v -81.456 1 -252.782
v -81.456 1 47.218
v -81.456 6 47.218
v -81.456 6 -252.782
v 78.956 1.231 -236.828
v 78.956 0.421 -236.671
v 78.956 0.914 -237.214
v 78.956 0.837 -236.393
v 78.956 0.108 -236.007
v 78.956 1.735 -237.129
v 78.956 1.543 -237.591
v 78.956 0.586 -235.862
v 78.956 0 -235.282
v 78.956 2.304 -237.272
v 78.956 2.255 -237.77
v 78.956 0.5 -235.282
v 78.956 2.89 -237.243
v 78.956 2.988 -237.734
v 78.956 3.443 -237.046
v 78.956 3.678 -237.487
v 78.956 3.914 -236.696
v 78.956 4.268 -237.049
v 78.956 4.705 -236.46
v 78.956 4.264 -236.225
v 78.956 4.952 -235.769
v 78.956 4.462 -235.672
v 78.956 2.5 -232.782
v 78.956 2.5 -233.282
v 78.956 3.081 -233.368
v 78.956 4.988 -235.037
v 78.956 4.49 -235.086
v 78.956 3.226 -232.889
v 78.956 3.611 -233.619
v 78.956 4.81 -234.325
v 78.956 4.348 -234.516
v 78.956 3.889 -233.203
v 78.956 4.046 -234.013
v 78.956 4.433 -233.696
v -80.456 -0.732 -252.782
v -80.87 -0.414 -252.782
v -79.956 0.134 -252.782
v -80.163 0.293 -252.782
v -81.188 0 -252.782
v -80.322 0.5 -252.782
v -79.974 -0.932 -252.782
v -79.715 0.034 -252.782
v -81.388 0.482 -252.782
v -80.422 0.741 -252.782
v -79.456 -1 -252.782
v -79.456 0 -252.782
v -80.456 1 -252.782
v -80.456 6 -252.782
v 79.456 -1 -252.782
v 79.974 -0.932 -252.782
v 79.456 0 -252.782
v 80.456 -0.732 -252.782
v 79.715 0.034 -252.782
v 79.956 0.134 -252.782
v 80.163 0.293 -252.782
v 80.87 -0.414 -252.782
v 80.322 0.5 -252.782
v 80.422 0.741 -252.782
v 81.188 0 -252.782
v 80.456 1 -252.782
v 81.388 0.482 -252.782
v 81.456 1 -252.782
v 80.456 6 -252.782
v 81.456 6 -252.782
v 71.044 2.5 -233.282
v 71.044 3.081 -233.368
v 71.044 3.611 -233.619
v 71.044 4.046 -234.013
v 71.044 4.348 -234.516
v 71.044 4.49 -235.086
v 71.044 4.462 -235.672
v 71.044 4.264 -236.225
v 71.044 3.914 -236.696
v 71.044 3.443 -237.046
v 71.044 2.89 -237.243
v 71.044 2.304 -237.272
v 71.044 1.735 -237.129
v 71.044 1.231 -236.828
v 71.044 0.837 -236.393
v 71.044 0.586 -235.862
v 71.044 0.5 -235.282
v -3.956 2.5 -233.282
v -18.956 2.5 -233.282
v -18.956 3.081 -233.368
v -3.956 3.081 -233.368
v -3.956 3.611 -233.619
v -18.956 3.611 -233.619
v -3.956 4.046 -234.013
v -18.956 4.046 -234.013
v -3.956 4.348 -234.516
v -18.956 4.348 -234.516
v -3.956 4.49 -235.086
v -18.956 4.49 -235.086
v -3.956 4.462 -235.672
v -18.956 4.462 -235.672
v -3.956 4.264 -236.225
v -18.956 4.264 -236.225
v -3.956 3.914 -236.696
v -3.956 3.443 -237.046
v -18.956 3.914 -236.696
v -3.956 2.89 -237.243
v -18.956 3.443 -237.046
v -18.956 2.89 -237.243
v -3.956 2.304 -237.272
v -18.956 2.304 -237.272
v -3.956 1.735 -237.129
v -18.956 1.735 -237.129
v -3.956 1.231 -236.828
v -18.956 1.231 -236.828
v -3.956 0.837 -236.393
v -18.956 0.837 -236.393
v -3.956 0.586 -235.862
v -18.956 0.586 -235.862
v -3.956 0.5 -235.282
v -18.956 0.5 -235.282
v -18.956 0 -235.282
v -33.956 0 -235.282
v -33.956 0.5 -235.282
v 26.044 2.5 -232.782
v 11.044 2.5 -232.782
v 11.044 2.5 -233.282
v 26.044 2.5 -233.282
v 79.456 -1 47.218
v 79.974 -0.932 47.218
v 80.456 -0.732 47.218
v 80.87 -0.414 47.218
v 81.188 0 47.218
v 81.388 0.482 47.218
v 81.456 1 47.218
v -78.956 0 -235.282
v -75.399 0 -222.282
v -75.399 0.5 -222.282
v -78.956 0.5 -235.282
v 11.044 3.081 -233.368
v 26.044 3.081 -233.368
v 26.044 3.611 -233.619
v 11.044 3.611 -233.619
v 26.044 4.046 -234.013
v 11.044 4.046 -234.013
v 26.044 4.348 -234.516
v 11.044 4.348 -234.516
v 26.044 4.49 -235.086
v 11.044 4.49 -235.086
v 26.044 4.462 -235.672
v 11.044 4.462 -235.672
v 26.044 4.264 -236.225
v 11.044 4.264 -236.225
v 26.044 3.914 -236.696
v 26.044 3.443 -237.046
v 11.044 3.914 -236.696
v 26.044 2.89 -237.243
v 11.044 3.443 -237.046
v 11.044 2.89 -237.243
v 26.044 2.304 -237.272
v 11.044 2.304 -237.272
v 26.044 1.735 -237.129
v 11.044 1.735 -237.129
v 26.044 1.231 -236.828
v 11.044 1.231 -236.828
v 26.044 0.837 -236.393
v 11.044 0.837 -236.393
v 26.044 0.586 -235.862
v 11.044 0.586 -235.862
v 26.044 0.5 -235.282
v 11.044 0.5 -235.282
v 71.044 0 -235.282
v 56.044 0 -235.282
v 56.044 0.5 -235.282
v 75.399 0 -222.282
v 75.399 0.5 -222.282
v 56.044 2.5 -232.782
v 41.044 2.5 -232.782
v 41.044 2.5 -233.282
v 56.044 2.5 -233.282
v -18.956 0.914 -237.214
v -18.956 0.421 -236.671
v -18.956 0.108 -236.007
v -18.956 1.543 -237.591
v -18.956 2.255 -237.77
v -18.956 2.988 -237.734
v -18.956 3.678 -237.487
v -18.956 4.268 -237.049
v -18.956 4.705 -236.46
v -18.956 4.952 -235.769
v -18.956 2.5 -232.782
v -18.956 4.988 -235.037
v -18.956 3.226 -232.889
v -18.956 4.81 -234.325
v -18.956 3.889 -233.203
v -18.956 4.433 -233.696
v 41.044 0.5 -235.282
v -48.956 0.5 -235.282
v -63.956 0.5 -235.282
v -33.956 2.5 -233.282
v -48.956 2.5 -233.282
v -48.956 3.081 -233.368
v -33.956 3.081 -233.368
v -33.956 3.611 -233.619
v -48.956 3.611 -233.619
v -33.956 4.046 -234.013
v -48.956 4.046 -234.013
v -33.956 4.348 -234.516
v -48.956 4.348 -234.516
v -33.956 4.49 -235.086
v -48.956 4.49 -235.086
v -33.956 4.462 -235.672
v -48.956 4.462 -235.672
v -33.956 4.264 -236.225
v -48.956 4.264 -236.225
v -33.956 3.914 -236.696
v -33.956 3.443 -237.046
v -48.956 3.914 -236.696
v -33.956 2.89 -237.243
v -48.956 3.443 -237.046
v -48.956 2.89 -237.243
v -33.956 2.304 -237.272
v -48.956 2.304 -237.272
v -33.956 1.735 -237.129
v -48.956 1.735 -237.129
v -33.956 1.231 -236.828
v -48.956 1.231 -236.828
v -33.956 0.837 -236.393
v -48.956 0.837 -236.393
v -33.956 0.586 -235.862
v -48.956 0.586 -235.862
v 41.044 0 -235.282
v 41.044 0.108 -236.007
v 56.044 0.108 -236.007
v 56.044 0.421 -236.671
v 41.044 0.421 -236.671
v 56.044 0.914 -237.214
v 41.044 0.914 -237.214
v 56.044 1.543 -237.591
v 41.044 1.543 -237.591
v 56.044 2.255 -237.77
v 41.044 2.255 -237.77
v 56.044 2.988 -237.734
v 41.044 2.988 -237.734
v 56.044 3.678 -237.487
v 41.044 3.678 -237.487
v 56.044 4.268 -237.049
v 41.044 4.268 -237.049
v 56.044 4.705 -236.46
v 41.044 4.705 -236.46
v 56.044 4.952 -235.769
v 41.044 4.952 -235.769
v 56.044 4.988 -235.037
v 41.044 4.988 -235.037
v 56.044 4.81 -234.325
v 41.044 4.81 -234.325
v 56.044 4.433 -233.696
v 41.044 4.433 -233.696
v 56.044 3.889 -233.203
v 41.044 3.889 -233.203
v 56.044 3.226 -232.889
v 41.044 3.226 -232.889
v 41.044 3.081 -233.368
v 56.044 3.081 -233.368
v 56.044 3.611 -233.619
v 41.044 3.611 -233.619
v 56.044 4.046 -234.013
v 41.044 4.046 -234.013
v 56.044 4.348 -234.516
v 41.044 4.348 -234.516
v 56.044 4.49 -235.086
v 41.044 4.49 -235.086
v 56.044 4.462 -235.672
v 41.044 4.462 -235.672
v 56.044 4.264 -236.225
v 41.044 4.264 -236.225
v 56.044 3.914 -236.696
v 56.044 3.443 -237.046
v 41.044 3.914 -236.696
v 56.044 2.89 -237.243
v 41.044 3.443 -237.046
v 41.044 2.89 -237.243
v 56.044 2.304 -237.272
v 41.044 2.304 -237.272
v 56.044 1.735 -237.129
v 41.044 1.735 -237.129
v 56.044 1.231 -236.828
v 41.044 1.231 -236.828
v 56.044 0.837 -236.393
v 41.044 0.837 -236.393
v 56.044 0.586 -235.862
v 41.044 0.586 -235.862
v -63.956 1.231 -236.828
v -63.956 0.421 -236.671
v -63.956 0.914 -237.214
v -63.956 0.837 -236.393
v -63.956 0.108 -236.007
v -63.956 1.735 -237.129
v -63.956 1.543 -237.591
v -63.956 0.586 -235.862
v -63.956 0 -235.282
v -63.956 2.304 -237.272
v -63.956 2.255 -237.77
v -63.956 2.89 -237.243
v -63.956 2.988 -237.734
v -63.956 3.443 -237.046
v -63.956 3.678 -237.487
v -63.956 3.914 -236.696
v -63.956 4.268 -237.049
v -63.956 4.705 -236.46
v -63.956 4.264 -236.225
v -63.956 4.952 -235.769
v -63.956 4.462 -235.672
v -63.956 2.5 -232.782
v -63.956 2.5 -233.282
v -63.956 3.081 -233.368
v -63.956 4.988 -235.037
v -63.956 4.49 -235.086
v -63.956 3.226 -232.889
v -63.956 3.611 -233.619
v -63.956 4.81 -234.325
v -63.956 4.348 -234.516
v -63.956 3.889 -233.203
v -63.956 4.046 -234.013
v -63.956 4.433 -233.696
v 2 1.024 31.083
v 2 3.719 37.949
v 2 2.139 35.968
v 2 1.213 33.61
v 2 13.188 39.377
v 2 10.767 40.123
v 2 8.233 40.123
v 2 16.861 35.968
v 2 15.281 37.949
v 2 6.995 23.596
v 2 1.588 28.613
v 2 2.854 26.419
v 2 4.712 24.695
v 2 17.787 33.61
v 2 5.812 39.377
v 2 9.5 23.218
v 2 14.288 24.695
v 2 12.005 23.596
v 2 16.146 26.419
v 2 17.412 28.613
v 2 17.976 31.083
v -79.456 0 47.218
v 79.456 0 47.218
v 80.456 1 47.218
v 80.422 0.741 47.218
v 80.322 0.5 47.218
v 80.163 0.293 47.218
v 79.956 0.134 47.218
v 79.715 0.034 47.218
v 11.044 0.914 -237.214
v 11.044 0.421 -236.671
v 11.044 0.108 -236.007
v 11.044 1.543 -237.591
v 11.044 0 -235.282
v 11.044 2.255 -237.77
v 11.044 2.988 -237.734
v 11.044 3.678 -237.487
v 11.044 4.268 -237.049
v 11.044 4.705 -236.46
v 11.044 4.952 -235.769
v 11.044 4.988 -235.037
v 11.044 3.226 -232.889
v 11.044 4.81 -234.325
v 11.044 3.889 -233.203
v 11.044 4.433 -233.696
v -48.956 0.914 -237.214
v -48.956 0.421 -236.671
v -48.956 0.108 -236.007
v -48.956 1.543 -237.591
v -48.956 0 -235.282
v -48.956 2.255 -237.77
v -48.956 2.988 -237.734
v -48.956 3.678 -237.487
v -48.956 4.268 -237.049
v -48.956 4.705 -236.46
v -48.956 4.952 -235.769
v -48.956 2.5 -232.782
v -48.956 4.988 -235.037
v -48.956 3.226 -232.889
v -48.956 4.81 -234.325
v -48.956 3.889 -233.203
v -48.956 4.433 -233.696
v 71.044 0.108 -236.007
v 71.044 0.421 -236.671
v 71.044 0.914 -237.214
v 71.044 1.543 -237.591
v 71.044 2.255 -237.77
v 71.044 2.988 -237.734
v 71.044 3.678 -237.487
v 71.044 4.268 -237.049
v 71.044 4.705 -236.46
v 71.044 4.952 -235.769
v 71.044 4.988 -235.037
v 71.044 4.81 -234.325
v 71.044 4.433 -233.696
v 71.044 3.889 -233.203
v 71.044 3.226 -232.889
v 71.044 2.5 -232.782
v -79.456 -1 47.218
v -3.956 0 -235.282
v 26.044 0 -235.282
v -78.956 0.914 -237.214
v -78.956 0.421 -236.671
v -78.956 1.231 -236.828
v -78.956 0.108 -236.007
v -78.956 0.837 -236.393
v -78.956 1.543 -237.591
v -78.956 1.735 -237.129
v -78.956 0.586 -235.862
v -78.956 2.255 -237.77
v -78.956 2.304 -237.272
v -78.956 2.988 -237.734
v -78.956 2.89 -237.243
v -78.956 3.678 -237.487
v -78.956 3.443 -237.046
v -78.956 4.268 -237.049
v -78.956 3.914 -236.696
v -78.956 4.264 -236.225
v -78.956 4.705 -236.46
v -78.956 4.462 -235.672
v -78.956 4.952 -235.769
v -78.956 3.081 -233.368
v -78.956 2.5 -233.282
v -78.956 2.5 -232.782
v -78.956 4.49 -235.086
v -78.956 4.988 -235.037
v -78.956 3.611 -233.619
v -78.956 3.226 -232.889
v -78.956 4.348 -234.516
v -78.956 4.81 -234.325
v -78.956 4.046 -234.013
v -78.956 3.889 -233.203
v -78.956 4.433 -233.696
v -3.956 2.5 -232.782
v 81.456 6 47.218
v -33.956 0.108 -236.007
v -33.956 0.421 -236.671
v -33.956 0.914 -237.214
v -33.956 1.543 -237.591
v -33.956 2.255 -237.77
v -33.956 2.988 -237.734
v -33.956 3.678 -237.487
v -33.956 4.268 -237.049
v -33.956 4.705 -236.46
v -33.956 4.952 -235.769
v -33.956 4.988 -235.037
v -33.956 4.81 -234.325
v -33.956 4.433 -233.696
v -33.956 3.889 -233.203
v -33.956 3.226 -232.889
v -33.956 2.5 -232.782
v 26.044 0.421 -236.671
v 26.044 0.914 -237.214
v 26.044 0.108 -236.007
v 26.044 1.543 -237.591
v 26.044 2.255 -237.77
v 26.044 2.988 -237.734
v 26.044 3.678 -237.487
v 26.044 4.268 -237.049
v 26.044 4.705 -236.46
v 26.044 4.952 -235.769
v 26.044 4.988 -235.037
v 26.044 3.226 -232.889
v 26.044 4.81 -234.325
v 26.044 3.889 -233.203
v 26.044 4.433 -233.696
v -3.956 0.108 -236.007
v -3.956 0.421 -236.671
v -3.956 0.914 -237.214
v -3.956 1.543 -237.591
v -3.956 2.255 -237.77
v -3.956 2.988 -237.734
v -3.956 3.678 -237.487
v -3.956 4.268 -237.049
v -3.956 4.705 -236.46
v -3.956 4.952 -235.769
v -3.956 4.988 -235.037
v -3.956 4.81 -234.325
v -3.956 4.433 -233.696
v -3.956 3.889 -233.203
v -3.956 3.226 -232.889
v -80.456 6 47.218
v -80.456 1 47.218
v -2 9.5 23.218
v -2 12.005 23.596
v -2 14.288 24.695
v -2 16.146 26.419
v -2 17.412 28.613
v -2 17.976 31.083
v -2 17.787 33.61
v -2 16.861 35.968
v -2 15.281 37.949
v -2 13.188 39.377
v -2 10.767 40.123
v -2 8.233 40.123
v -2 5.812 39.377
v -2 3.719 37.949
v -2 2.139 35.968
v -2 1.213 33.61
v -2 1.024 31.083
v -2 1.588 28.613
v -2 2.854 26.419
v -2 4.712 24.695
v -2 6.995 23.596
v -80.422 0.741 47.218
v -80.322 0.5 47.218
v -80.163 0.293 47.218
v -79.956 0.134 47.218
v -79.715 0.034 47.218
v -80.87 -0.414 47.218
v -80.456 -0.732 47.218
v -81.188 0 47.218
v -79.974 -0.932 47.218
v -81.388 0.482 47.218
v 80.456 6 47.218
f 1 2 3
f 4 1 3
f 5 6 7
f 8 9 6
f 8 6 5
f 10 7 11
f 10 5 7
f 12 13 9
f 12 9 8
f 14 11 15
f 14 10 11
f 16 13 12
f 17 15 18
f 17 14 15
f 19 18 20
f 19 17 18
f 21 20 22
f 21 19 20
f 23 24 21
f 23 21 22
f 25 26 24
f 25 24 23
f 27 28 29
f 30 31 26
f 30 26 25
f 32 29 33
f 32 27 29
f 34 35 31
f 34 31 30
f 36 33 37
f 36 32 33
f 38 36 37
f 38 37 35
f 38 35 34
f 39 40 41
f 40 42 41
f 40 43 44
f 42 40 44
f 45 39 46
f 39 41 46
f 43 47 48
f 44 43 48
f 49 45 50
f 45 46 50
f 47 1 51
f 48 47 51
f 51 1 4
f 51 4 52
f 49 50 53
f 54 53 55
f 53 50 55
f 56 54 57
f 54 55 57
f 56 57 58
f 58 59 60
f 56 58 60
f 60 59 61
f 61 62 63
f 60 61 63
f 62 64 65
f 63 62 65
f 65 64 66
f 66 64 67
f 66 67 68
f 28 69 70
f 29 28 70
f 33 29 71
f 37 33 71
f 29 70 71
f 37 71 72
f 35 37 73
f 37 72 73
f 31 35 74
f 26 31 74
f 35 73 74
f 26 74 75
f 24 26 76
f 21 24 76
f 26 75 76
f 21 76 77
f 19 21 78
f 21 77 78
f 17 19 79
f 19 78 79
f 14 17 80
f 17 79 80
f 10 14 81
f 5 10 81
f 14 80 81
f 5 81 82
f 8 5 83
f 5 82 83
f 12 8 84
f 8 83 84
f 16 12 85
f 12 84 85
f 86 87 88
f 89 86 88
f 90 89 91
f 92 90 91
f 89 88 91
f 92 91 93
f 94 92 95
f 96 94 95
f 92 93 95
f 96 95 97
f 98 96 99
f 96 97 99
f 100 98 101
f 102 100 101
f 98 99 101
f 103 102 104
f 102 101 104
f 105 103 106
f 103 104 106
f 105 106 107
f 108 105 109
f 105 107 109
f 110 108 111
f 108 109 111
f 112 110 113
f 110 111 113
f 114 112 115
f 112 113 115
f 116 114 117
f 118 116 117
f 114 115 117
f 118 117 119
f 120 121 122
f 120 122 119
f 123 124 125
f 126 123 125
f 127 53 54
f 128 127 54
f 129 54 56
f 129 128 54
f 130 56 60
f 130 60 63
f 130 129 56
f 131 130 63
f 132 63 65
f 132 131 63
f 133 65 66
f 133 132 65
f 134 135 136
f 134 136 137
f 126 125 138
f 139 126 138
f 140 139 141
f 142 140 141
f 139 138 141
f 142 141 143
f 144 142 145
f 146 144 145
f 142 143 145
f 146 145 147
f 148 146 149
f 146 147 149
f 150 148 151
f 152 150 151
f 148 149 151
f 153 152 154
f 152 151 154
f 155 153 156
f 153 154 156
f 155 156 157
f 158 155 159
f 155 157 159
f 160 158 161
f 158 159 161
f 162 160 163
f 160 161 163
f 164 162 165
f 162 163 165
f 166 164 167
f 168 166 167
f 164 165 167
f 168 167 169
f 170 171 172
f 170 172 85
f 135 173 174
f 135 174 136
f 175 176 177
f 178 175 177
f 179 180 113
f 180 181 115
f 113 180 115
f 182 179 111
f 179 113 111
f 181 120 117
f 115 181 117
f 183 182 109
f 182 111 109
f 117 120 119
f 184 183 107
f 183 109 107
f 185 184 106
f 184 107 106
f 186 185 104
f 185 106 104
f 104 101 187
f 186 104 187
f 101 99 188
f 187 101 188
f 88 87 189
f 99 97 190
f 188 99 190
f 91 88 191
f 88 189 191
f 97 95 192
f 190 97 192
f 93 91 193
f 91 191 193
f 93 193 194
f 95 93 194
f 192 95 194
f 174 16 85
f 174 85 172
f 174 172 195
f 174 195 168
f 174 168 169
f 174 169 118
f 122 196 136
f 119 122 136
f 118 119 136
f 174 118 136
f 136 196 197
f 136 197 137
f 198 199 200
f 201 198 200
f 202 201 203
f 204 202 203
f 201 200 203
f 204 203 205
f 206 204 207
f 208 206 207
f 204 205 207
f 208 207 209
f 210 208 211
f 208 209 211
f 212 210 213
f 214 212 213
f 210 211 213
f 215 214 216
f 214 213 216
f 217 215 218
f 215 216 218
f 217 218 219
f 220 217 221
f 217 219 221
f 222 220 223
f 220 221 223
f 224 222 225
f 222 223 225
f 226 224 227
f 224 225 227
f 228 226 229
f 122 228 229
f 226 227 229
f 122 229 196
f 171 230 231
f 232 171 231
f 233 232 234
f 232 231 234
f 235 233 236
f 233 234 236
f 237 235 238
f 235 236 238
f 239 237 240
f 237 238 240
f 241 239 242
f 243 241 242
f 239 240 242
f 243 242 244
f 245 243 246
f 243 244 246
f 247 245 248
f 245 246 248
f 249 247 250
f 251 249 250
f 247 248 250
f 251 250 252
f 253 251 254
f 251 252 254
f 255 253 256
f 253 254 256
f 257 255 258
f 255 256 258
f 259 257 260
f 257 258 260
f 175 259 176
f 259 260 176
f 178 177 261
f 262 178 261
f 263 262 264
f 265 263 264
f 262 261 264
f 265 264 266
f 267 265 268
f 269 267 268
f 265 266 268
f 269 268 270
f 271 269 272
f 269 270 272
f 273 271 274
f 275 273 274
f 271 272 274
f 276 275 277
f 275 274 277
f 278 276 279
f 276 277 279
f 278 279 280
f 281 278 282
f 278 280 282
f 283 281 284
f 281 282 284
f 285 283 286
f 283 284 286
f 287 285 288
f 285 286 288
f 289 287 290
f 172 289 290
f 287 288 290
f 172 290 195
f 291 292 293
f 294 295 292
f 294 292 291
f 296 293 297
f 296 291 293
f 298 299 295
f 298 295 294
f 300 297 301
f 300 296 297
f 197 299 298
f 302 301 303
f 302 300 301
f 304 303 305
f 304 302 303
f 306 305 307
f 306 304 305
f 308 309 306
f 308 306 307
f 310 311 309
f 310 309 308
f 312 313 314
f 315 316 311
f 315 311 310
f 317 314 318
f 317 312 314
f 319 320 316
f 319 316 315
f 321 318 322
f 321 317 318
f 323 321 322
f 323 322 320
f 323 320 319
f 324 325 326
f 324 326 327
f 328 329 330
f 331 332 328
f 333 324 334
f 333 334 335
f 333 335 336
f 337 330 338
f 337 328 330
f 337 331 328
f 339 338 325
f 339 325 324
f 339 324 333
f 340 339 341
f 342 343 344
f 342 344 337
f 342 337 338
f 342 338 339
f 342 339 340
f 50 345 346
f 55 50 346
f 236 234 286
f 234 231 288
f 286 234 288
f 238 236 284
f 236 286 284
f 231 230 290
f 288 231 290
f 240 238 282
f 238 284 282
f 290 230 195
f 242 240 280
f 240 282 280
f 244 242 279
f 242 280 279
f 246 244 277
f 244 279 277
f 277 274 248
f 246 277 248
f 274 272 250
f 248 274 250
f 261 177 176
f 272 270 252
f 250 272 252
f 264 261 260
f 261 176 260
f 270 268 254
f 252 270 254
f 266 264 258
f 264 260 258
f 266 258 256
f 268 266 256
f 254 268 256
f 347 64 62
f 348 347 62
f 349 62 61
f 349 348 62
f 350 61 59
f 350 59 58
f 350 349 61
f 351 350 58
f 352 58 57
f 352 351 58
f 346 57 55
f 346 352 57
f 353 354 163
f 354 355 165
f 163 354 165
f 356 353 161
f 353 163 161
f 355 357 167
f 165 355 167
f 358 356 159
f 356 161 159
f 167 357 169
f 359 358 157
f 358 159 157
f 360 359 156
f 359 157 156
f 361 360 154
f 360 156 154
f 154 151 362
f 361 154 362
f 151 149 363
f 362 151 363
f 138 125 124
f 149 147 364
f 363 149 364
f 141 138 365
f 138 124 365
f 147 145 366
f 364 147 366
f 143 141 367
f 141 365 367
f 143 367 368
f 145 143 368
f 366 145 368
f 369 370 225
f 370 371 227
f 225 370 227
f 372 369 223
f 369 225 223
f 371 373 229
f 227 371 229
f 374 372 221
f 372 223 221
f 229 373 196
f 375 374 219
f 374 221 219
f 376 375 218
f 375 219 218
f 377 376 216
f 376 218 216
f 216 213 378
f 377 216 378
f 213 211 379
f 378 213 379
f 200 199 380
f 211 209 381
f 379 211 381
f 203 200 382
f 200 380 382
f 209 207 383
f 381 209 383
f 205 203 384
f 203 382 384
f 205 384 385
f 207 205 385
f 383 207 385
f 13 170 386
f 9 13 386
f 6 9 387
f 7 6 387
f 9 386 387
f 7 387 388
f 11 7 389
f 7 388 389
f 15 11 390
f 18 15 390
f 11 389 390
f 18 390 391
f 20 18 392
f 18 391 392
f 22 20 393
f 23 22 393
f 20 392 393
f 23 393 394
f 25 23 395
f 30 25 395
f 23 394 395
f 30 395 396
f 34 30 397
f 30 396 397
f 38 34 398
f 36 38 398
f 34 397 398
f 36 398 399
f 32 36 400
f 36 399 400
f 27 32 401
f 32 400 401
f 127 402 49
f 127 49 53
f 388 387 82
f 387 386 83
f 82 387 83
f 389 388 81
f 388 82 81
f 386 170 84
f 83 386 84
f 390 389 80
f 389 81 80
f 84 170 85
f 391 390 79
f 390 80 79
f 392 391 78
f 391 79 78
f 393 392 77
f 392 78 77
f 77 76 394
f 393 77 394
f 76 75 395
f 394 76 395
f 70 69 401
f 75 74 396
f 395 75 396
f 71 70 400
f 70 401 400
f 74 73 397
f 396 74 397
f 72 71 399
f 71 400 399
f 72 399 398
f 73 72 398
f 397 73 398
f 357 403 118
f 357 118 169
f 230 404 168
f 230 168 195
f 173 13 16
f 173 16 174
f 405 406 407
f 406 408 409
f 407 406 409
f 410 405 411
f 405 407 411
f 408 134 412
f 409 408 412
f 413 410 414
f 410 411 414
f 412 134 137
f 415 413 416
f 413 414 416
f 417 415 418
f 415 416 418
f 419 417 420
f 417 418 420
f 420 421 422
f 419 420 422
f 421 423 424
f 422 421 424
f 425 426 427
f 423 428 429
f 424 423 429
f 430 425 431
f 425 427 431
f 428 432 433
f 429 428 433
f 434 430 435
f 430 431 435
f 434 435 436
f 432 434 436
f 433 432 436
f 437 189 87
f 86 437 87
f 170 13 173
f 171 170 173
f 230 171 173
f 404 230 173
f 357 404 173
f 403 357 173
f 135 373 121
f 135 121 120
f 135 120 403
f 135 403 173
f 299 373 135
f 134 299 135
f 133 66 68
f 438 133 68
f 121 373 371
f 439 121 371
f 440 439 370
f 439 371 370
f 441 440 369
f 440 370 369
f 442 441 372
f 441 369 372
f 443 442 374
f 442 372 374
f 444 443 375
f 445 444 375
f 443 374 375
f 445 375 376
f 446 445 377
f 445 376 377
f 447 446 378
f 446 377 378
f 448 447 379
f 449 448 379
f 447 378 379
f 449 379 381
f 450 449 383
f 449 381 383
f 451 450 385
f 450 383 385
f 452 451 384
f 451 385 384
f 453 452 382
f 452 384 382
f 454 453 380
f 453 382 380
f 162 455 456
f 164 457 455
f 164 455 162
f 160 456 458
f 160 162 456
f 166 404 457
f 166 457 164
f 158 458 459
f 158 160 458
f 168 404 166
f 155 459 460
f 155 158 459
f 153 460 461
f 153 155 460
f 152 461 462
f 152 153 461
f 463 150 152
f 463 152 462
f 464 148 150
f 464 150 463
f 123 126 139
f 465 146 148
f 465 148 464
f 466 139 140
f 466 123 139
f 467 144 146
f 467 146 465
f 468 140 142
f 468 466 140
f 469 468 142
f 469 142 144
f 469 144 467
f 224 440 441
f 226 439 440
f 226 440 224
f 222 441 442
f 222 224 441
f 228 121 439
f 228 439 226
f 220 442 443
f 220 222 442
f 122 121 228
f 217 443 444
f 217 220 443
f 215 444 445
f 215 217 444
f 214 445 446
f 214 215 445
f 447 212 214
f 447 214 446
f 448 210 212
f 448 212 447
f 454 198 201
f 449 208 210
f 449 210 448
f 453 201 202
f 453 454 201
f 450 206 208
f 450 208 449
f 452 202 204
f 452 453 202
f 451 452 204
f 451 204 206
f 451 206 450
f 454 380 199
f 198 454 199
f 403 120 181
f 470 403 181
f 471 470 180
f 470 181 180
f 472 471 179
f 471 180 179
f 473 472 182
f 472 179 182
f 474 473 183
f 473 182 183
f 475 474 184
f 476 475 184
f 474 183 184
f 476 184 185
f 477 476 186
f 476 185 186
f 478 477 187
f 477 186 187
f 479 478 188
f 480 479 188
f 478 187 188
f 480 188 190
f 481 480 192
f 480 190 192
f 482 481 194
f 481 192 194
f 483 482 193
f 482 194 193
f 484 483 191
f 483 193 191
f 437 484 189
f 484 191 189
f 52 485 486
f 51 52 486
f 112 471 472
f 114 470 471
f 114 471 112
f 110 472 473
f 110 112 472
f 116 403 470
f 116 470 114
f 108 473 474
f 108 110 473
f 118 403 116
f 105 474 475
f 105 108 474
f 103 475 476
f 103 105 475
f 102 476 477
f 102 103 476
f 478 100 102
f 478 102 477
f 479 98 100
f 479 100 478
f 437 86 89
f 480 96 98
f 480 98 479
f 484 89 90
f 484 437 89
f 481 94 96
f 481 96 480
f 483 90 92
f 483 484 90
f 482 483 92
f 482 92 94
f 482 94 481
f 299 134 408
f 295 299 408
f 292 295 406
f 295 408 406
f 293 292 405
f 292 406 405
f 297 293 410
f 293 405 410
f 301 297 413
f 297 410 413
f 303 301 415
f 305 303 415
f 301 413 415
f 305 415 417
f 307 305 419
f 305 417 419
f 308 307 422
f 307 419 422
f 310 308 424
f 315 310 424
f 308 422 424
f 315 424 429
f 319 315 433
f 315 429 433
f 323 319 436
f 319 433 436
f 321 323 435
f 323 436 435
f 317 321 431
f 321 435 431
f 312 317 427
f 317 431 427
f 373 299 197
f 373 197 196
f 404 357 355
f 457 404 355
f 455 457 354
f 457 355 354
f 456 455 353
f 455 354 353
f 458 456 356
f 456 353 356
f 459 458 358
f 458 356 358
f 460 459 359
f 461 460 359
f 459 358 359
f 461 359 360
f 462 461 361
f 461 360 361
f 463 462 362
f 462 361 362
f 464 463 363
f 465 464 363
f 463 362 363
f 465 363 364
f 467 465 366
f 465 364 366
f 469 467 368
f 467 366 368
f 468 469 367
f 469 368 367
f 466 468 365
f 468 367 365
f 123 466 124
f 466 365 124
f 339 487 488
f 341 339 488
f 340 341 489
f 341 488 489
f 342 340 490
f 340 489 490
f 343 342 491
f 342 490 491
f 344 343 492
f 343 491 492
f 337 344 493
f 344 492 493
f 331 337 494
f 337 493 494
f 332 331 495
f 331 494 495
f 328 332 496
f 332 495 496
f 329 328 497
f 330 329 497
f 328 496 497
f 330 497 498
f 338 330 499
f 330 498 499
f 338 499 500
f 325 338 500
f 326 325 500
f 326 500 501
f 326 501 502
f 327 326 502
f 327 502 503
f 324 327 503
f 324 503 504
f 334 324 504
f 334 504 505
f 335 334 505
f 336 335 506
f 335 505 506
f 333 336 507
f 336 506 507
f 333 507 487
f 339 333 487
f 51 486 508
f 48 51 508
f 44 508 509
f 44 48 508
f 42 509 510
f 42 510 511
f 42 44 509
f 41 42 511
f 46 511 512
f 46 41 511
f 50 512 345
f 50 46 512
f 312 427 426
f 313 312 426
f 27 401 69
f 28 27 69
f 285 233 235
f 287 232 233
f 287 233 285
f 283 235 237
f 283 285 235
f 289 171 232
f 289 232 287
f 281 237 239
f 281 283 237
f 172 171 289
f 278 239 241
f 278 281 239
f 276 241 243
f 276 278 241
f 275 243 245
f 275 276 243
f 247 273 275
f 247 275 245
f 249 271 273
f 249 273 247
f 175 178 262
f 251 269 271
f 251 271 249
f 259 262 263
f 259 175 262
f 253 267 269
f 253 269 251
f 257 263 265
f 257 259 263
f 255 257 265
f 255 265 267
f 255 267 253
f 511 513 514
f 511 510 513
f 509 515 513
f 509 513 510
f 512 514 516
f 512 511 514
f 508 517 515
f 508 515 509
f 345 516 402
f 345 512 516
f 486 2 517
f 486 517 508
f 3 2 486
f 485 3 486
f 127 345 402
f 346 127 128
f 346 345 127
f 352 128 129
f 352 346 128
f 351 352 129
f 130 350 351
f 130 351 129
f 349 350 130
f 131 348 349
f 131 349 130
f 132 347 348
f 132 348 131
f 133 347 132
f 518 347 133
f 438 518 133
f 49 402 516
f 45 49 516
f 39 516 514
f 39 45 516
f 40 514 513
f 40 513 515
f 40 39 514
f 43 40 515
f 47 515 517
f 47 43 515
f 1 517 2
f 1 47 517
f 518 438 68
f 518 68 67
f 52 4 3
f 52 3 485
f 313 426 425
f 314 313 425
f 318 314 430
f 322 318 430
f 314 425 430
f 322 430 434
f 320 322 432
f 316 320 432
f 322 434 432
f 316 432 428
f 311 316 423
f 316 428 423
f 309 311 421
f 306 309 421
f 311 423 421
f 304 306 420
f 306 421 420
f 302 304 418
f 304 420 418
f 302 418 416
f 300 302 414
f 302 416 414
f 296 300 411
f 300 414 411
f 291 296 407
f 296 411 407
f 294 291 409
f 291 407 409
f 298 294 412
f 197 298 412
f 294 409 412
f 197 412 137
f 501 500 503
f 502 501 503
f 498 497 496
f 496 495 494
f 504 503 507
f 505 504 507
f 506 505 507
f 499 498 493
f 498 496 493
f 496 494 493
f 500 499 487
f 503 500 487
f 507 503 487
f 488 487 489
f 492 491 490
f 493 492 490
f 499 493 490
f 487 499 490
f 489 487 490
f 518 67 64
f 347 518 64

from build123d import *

# Parameters (mm, degrees)
EXTRUDE_1_DEPTH                    = 0.5
OTHER_START                        = -78.955969349
OTHER_1_DEPTH                      = 15
PATTERN_LINEAR_2_COUNT             = 5
PATTERN_LINEAR_2_PITCH             = 30
OTHER_START_2                      = 71.044030651
OTHER_3_DEPTH                      = 7.911938698
SKETCH_14_W                        = 160.911938698
SKETCH_14_H                        = 300
SM_BASE_FLANGE_1_DEPTH             = 1
SM_EDGE_FLANGE_1_STRIP_W           = 6
SM_EDGE_FLANGE_1_STRIP_H           = 1
SM_EDGE_FLANGE_1_STRIP_CUT_DEPTH   = 300
SM_EDGE_FLANGE_1_STRIP_2_W         = 6
SM_EDGE_FLANGE_1_STRIP_2_H         = 1
SM_EDGE_FLANGE_1_STRIP_CUT_2_DEPTH = 300
SM_EDGE_FLANGE_1_DEPTH             = 300
SM_EDGE_FLANGE_1_BEND_DEPTH        = 300
EXTRUDE_2_DEPTH                    = 2
EXTRUDE_2_DEPTH_BACK               = 2
SKETCH_23_R                        = 8.5


# Read off the part's stored shape, not the designer's step: Каемка1, Каемка3
# Sheet-metal steps are written as plain solids
with BuildPart() as part:
    # Sketch 1 → Бобышка-Вытянуть1 (new body)
    with BuildSketch(Plane(origin=(0, 0, 0), x_dir=(1, 0, 0), z_dir=(0, 1, 0))):
        Polygon((-78.955969349, 235.281709088), (78.955969349, 235.281709088), (75.399475479, 222.281709088), (-75.399475479, 222.281709088), align=None)
    extrude(amount=EXTRUDE_1_DEPTH)

    # Other 1 outline → Other 1 (add)
    with BuildSketch(Plane.YZ.offset(OTHER_START)):
        with BuildLine():
            Line((2.5, -232.781709088), (2.5, -233.281709088))
            ThreePointArc((2.5, -233.281709088), (3.914213562, -236.69592265), (0.5, -235.281709088))
            Line((0.5, -235.281709088), (0, -235.281709088))
            ThreePointArc((0, -235.281709088), (4.267766953, -237.049476041), (2.5, -232.781709088))
        make_face()
    other_1 = extrude(amount=OTHER_1_DEPTH)

    # Линейный массив2: Other 1 ×5
    with Locations(*[(i * PATTERN_LINEAR_2_PITCH, 0, 0) for i in range(1, PATTERN_LINEAR_2_COUNT)]):
        add(other_1)

    # Other 3 outline → Other 3 (add)
    with BuildSketch(Plane.YZ.offset(OTHER_START_2)):
        with BuildLine():
            Line((2.5, -232.781709088), (2.5, -233.281709088))
            ThreePointArc((2.5, -233.281709088), (3.914213562, -236.69592265), (0.5, -235.281709088))
            Line((0.5, -235.281709088), (0, -235.281709088))
            ThreePointArc((0, -235.281709088), (4.267766953, -237.049476041), (2.5, -232.781709088))
        make_face()
    extrude(amount=OTHER_3_DEPTH)


with BuildPart() as body_2:
    # Эскиз14 → Базовая кромка1 (new body)
    with BuildSketch(Plane.XZ):
        with Locations((0, -102.781709088)):
            Rectangle(SKETCH_14_W, SKETCH_14_H)
    extrude(amount=SM_BASE_FLANGE_1_DEPTH)

    # Ребро-кромка1 strip (across the edge) → Ребро-кромка1 strip cut (cut)
    with BuildSketch(Plane(origin=(-80.455969349, 0, -252.781709088), x_dir=(1, 0, 0), z_dir=(0, 0, 1))):
        with Locations((-2, -0.5)):
            Rectangle(SM_EDGE_FLANGE_1_STRIP_W, SM_EDGE_FLANGE_1_STRIP_H)
    extrude(amount=SM_EDGE_FLANGE_1_STRIP_CUT_DEPTH, mode=Mode.SUBTRACT)

    # Ребро-кромка1 strip 2 (across the edge) → Ребро-кромка1 strip cut 2 (cut)
    with BuildSketch(Plane(origin=(80.455969349, 0, 47.218290912), x_dir=(-1, 0, 0), z_dir=(0, 0, -1))):
        with Locations((-2, -0.5)):
            Rectangle(SM_EDGE_FLANGE_1_STRIP_2_W, SM_EDGE_FLANGE_1_STRIP_2_H)
    extrude(amount=SM_EDGE_FLANGE_1_STRIP_CUT_2_DEPTH, mode=Mode.SUBTRACT)

    # Ребро-кромка1 section (across the edge) → Ребро-кромка1 (add)
    with BuildSketch(Plane(origin=(-80.455969349, 0, -252.781709088), x_dir=(1, 0, 0), z_dir=(0, 0, 1))):
        with BuildLine():
            Line((-1, 1), (-1, 6))
            Line((-1, 6), (0, 6))
            Line((0, 6), (0, 1))
            ThreePointArc((0, 1), (0.292893219, 0.292893219), (1, 0))
            Line((1, 0), (1, -1))
            ThreePointArc((1, -1), (-0.414213562, -0.414213562), (-1, 1))
        make_face()
    extrude(amount=SM_EDGE_FLANGE_1_DEPTH)

    # Ребро-кромка1 section 2 (across the edge) → Ребро-кромка1 bend (add)
    with BuildSketch(Plane(origin=(80.455969349, 0, 47.218290912), x_dir=(-1, 0, 0), z_dir=(0, 0, -1))):
        with BuildLine():
            Line((-1, 1), (-1, 6))
            Line((-1, 6), (0, 6))
            Line((0, 6), (0, 1))
            ThreePointArc((0, 1), (0.292893219, 0.292893219), (1, 0))
            Line((1, 0), (1, -1))
            ThreePointArc((1, -1), (-0.414213562, -0.414213562), (-1, 1))
        make_face()
    extrude(amount=SM_EDGE_FLANGE_1_BEND_DEPTH)


with BuildPart() as body_3:
    # Эскиз23 → Бобышка-Вытянуть2 (new, two sides: drawn at the far end of the back side and taken through both)
    with BuildSketch(Plane(origin=(0, 0, 0), x_dir=(0, 0, -1), z_dir=(1, 0, 0)).offset(-EXTRUDE_2_DEPTH_BACK)):
        with Locations((-31.718290912, 9.5)):
            Circle(SKETCH_23_R)
    extrude(amount=EXTRUDE_2_DEPTH + EXTRUDE_2_DEPTH_BACK)


solid = Compound([part.part, body_2.part, body_3.part])
